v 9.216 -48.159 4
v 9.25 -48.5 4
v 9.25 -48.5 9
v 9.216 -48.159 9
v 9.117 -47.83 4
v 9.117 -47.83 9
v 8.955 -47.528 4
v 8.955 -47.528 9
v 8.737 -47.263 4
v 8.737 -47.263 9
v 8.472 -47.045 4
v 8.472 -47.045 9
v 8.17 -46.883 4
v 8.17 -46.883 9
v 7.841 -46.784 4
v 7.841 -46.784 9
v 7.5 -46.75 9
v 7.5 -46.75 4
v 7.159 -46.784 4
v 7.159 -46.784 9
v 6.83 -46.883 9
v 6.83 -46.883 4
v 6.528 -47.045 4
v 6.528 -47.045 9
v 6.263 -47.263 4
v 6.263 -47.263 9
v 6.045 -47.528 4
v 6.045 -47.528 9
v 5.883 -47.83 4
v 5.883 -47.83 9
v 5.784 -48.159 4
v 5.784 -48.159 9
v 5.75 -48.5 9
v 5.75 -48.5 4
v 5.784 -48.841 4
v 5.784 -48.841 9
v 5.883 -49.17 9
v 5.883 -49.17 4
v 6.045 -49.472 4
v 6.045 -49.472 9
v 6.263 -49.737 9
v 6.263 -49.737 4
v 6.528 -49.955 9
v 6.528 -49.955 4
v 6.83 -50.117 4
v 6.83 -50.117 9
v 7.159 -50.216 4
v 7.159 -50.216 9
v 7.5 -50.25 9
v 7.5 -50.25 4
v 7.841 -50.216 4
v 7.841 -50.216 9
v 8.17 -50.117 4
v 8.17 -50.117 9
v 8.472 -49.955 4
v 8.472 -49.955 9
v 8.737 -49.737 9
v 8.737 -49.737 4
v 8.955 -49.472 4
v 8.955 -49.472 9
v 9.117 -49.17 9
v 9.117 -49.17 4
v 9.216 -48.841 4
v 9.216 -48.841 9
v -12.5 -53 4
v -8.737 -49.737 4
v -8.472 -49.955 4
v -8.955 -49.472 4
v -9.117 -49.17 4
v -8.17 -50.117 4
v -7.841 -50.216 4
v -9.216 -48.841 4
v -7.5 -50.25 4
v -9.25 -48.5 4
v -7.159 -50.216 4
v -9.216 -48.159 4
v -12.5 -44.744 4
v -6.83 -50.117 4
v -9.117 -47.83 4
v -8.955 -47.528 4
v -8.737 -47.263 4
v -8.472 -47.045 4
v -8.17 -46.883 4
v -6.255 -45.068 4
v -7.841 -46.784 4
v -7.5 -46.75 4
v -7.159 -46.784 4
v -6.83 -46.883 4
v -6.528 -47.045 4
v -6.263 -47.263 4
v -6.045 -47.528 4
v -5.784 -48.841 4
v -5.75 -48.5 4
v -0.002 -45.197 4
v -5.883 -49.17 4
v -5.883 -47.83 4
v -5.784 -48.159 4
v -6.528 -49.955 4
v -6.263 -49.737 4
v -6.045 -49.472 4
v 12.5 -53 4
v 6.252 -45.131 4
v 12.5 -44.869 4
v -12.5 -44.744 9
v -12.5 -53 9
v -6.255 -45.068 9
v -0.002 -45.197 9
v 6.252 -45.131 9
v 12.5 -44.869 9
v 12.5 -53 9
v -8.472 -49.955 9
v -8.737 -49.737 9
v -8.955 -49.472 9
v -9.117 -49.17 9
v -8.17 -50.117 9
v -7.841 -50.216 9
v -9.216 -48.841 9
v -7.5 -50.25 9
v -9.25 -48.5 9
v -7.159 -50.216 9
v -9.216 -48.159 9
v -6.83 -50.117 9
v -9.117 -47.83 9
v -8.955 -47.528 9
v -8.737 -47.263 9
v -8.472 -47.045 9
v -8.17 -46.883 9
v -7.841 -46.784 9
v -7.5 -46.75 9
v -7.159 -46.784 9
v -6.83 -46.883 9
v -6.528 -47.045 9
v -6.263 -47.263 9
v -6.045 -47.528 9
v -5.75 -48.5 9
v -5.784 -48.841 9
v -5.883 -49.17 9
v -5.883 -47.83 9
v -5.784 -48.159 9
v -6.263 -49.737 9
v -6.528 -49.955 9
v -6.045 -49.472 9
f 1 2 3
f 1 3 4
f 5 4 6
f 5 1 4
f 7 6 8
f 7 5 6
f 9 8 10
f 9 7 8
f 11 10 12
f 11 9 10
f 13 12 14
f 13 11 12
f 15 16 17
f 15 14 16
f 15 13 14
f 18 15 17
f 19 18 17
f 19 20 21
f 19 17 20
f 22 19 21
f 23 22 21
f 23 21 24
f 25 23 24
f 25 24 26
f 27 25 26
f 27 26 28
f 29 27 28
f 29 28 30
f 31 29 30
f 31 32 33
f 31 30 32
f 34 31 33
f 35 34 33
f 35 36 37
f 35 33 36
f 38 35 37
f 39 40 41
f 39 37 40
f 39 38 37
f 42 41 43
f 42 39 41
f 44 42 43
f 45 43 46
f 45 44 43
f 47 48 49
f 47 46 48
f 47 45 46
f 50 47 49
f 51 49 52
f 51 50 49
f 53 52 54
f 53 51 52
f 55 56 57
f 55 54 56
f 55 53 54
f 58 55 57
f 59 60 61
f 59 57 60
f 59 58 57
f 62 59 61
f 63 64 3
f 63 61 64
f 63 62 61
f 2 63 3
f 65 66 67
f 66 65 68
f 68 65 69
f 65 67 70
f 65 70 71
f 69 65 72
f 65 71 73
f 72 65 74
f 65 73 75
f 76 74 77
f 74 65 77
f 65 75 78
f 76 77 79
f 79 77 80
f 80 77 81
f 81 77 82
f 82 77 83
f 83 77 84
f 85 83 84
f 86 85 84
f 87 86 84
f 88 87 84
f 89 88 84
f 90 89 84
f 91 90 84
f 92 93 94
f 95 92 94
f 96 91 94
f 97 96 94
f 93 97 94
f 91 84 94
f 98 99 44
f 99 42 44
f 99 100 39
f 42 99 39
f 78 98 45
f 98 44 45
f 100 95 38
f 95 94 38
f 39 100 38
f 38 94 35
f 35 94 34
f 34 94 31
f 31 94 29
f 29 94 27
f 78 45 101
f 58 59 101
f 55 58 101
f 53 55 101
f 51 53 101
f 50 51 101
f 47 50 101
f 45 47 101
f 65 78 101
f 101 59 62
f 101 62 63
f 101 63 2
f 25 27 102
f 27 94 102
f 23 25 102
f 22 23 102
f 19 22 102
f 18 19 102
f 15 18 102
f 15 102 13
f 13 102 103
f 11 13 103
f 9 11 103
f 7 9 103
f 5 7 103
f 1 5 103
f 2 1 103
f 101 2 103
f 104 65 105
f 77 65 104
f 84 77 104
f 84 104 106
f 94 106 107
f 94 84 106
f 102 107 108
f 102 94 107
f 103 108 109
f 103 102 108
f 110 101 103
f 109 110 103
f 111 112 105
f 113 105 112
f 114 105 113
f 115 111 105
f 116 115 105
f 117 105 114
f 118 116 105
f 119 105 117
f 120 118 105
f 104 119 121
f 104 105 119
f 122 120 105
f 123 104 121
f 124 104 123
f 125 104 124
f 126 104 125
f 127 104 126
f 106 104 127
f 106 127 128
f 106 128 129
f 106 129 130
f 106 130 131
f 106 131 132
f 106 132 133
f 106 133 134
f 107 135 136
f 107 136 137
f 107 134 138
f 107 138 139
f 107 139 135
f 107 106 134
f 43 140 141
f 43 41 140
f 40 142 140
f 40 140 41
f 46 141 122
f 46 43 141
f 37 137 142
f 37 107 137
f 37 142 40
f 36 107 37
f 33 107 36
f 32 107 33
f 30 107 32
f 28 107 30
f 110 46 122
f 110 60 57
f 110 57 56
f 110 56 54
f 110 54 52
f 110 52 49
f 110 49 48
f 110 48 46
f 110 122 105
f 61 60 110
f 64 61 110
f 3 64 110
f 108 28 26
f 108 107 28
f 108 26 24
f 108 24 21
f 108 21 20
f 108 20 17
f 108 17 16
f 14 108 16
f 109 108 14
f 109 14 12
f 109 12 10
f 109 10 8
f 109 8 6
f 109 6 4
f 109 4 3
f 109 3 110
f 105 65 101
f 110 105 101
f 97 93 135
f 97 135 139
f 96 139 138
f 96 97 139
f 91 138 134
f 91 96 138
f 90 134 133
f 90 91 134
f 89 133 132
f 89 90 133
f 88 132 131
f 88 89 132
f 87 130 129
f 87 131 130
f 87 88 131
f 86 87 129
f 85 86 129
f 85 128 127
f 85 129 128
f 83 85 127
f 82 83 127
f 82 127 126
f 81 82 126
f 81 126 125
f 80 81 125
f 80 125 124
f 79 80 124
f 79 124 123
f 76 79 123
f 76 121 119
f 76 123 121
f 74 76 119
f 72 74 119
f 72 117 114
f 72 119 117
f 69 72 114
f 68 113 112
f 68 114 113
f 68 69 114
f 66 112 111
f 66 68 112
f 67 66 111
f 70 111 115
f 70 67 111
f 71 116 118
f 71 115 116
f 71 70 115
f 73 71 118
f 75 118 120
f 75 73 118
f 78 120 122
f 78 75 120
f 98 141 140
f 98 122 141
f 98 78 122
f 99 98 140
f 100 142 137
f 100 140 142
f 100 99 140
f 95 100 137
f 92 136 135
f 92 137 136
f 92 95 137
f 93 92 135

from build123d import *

# Parameters (mm, degrees)
CYLINDER035_R     = 1.75
CYLINDER035_DEPTH = 10
CYLINDER036_R     = 1.75
CYLINDER036_DEPTH = 10
CYLINDER033_R     = 200
CYLINDER033_DEPTH = 36
CYLINDER031_R     = 200
CYLINDER031_DEPTH = 53
BOX008_W          = 60
BOX008_H          = 99
BOX008_DEPTH      = 29
CYLINDER032_R     = 310
CYLINDER032_DEPTH = 77
CYLINDER030_R     = 700
CYLINDER030_DEPTH = 36
CYLINDER034_R     = 700
CYLINDER034_DEPTH = 36
FILLET006_R       = 4.2
BOX004_W          = 25
BOX004_H          = 10
BOX004_DEPTH      = 5


with BuildPart() as cylinder035:
    # Cylinder035 → Cylinder035 (new body)
    with BuildSketch(Plane(origin=(7.5, -47.5, 0), x_dir=(1, 0, 0), z_dir=(0, 0, 1))):
        Circle(CYLINDER035_R)
    extrude(amount=CYLINDER035_DEPTH)


with BuildPart() as screw_holes001:
    # Cylinder036 → Cylinder036 (new body)
    with BuildSketch(Plane(origin=(-7.5, -47.5, 0), x_dir=(1, 0, 0), z_dir=(0, 0, 1))):
        Circle(CYLINDER036_R)
    extrude(amount=CYLINDER036_DEPTH)

    # Fusion001: union Cylinder035
    add(cylinder035.part)


with BuildPart() as screw_holes001_1:
    # Fusion001 placement: moved
    add(screw_holes001.part.moved(Location((0, -1, 1))))


with BuildPart() as short_side_circle018:
    # Cylinder033 → Cylinder033 (new body)
    with BuildSketch(Plane(origin=(0, -154.8, 0), x_dir=(1, 0, 0), z_dir=(0, 0, 1))):
        Circle(CYLINDER033_R)
    extrude(amount=CYLINDER033_DEPTH)


with BuildPart() as short_side_circle016:
    # Cylinder031 → Cylinder031 (new body)
    with BuildSketch(Plane(origin=(1, 154.8, 0), x_dir=(1, 0, 0), z_dir=(0, 0, 1))):
        Circle(CYLINDER031_R)
    extrude(amount=CYLINDER031_DEPTH)


with BuildPart() as common028:
    # Box008 → Box008 (new body)
    with BuildSketch(Plane(origin=(-29.77, -50.31, 14), x_dir=(1, 0, 0), z_dir=(0, 0, 1))):
        with Locations((30, 49.5)):
            Rectangle(BOX008_W, BOX008_H)
    extrude(amount=BOX008_DEPTH)

    # Common028: intersect Short side circle016
    add(short_side_circle016.part, mode=Mode.INTERSECT)


with BuildPart() as common029:
    # Cylinder032 → Cylinder032 (new body)
    with BuildSketch(Plane(origin=(-32, 1, -262.75), x_dir=(0, 0, -1), z_dir=(1, 0, 0))):
        Circle(CYLINDER032_R)
    extrude(amount=CYLINDER032_DEPTH)

    # Common029: intersect Common028
    add(common028.part, mode=Mode.INTERSECT)


with BuildPart() as common030:
    # Cylinder030 → Cylinder030 (new body)
    with BuildSketch(Plane(origin=(671.8, 0, 0), x_dir=(1, 0, 0), z_dir=(0, 0, 1))):
        Circle(CYLINDER030_R)
    extrude(amount=CYLINDER030_DEPTH)

    # Common030: intersect Common029
    add(common029.part, mode=Mode.INTERSECT)


with BuildPart() as pad_cut002:
    # Cylinder034 → Cylinder034 (new body)
    with BuildSketch(Plane(origin=(-671.8, 0, 0), x_dir=(1, 0, 0), z_dir=(0, 0, 1))):
        Circle(CYLINDER034_R)
    extrude(amount=CYLINDER034_DEPTH)

    # Common031: intersect Common030
    add(common030.part, mode=Mode.INTERSECT)

    # Common032: intersect Short side circle018
    add(short_side_circle018.part, mode=Mode.INTERSECT)

    # Fillet006
    fillet006_edges = [pad_cut002.edges().sort_by_distance(p)[0] for p in [
        (26.845655, -43.522974, 25),
        (26.85399, 43.388958, 25),
        (-26.862626, -43.249676, 25),
        (-26.85399, 43.388958, 25),
    ]]
    fillet(fillet006_edges, radius=FILLET006_R)


with BuildPart() as pad_cut002_1:
    # Fillet006 placement: moved
    add(pad_cut002.part.moved(Location((0, 0, -15))))


with BuildPart() as band_attachement:
    # Box004 → Box004 (new body)
    with BuildSketch(Plane(origin=(-12.5, -53, 4), x_dir=(1, 0, 0), z_dir=(0, 0, 1))):
        with Locations((12.5, 5)):
            Rectangle(BOX004_W, BOX004_H)
    extrude(amount=BOX004_DEPTH)

    # Cut006: cut Pad cut002
    add(pad_cut002_1.part, mode=Mode.SUBTRACT)

    # Cut007: cut Screw holes001
    add(screw_holes001_1.part, mode=Mode.SUBTRACT)


solid = band_attachement.part
